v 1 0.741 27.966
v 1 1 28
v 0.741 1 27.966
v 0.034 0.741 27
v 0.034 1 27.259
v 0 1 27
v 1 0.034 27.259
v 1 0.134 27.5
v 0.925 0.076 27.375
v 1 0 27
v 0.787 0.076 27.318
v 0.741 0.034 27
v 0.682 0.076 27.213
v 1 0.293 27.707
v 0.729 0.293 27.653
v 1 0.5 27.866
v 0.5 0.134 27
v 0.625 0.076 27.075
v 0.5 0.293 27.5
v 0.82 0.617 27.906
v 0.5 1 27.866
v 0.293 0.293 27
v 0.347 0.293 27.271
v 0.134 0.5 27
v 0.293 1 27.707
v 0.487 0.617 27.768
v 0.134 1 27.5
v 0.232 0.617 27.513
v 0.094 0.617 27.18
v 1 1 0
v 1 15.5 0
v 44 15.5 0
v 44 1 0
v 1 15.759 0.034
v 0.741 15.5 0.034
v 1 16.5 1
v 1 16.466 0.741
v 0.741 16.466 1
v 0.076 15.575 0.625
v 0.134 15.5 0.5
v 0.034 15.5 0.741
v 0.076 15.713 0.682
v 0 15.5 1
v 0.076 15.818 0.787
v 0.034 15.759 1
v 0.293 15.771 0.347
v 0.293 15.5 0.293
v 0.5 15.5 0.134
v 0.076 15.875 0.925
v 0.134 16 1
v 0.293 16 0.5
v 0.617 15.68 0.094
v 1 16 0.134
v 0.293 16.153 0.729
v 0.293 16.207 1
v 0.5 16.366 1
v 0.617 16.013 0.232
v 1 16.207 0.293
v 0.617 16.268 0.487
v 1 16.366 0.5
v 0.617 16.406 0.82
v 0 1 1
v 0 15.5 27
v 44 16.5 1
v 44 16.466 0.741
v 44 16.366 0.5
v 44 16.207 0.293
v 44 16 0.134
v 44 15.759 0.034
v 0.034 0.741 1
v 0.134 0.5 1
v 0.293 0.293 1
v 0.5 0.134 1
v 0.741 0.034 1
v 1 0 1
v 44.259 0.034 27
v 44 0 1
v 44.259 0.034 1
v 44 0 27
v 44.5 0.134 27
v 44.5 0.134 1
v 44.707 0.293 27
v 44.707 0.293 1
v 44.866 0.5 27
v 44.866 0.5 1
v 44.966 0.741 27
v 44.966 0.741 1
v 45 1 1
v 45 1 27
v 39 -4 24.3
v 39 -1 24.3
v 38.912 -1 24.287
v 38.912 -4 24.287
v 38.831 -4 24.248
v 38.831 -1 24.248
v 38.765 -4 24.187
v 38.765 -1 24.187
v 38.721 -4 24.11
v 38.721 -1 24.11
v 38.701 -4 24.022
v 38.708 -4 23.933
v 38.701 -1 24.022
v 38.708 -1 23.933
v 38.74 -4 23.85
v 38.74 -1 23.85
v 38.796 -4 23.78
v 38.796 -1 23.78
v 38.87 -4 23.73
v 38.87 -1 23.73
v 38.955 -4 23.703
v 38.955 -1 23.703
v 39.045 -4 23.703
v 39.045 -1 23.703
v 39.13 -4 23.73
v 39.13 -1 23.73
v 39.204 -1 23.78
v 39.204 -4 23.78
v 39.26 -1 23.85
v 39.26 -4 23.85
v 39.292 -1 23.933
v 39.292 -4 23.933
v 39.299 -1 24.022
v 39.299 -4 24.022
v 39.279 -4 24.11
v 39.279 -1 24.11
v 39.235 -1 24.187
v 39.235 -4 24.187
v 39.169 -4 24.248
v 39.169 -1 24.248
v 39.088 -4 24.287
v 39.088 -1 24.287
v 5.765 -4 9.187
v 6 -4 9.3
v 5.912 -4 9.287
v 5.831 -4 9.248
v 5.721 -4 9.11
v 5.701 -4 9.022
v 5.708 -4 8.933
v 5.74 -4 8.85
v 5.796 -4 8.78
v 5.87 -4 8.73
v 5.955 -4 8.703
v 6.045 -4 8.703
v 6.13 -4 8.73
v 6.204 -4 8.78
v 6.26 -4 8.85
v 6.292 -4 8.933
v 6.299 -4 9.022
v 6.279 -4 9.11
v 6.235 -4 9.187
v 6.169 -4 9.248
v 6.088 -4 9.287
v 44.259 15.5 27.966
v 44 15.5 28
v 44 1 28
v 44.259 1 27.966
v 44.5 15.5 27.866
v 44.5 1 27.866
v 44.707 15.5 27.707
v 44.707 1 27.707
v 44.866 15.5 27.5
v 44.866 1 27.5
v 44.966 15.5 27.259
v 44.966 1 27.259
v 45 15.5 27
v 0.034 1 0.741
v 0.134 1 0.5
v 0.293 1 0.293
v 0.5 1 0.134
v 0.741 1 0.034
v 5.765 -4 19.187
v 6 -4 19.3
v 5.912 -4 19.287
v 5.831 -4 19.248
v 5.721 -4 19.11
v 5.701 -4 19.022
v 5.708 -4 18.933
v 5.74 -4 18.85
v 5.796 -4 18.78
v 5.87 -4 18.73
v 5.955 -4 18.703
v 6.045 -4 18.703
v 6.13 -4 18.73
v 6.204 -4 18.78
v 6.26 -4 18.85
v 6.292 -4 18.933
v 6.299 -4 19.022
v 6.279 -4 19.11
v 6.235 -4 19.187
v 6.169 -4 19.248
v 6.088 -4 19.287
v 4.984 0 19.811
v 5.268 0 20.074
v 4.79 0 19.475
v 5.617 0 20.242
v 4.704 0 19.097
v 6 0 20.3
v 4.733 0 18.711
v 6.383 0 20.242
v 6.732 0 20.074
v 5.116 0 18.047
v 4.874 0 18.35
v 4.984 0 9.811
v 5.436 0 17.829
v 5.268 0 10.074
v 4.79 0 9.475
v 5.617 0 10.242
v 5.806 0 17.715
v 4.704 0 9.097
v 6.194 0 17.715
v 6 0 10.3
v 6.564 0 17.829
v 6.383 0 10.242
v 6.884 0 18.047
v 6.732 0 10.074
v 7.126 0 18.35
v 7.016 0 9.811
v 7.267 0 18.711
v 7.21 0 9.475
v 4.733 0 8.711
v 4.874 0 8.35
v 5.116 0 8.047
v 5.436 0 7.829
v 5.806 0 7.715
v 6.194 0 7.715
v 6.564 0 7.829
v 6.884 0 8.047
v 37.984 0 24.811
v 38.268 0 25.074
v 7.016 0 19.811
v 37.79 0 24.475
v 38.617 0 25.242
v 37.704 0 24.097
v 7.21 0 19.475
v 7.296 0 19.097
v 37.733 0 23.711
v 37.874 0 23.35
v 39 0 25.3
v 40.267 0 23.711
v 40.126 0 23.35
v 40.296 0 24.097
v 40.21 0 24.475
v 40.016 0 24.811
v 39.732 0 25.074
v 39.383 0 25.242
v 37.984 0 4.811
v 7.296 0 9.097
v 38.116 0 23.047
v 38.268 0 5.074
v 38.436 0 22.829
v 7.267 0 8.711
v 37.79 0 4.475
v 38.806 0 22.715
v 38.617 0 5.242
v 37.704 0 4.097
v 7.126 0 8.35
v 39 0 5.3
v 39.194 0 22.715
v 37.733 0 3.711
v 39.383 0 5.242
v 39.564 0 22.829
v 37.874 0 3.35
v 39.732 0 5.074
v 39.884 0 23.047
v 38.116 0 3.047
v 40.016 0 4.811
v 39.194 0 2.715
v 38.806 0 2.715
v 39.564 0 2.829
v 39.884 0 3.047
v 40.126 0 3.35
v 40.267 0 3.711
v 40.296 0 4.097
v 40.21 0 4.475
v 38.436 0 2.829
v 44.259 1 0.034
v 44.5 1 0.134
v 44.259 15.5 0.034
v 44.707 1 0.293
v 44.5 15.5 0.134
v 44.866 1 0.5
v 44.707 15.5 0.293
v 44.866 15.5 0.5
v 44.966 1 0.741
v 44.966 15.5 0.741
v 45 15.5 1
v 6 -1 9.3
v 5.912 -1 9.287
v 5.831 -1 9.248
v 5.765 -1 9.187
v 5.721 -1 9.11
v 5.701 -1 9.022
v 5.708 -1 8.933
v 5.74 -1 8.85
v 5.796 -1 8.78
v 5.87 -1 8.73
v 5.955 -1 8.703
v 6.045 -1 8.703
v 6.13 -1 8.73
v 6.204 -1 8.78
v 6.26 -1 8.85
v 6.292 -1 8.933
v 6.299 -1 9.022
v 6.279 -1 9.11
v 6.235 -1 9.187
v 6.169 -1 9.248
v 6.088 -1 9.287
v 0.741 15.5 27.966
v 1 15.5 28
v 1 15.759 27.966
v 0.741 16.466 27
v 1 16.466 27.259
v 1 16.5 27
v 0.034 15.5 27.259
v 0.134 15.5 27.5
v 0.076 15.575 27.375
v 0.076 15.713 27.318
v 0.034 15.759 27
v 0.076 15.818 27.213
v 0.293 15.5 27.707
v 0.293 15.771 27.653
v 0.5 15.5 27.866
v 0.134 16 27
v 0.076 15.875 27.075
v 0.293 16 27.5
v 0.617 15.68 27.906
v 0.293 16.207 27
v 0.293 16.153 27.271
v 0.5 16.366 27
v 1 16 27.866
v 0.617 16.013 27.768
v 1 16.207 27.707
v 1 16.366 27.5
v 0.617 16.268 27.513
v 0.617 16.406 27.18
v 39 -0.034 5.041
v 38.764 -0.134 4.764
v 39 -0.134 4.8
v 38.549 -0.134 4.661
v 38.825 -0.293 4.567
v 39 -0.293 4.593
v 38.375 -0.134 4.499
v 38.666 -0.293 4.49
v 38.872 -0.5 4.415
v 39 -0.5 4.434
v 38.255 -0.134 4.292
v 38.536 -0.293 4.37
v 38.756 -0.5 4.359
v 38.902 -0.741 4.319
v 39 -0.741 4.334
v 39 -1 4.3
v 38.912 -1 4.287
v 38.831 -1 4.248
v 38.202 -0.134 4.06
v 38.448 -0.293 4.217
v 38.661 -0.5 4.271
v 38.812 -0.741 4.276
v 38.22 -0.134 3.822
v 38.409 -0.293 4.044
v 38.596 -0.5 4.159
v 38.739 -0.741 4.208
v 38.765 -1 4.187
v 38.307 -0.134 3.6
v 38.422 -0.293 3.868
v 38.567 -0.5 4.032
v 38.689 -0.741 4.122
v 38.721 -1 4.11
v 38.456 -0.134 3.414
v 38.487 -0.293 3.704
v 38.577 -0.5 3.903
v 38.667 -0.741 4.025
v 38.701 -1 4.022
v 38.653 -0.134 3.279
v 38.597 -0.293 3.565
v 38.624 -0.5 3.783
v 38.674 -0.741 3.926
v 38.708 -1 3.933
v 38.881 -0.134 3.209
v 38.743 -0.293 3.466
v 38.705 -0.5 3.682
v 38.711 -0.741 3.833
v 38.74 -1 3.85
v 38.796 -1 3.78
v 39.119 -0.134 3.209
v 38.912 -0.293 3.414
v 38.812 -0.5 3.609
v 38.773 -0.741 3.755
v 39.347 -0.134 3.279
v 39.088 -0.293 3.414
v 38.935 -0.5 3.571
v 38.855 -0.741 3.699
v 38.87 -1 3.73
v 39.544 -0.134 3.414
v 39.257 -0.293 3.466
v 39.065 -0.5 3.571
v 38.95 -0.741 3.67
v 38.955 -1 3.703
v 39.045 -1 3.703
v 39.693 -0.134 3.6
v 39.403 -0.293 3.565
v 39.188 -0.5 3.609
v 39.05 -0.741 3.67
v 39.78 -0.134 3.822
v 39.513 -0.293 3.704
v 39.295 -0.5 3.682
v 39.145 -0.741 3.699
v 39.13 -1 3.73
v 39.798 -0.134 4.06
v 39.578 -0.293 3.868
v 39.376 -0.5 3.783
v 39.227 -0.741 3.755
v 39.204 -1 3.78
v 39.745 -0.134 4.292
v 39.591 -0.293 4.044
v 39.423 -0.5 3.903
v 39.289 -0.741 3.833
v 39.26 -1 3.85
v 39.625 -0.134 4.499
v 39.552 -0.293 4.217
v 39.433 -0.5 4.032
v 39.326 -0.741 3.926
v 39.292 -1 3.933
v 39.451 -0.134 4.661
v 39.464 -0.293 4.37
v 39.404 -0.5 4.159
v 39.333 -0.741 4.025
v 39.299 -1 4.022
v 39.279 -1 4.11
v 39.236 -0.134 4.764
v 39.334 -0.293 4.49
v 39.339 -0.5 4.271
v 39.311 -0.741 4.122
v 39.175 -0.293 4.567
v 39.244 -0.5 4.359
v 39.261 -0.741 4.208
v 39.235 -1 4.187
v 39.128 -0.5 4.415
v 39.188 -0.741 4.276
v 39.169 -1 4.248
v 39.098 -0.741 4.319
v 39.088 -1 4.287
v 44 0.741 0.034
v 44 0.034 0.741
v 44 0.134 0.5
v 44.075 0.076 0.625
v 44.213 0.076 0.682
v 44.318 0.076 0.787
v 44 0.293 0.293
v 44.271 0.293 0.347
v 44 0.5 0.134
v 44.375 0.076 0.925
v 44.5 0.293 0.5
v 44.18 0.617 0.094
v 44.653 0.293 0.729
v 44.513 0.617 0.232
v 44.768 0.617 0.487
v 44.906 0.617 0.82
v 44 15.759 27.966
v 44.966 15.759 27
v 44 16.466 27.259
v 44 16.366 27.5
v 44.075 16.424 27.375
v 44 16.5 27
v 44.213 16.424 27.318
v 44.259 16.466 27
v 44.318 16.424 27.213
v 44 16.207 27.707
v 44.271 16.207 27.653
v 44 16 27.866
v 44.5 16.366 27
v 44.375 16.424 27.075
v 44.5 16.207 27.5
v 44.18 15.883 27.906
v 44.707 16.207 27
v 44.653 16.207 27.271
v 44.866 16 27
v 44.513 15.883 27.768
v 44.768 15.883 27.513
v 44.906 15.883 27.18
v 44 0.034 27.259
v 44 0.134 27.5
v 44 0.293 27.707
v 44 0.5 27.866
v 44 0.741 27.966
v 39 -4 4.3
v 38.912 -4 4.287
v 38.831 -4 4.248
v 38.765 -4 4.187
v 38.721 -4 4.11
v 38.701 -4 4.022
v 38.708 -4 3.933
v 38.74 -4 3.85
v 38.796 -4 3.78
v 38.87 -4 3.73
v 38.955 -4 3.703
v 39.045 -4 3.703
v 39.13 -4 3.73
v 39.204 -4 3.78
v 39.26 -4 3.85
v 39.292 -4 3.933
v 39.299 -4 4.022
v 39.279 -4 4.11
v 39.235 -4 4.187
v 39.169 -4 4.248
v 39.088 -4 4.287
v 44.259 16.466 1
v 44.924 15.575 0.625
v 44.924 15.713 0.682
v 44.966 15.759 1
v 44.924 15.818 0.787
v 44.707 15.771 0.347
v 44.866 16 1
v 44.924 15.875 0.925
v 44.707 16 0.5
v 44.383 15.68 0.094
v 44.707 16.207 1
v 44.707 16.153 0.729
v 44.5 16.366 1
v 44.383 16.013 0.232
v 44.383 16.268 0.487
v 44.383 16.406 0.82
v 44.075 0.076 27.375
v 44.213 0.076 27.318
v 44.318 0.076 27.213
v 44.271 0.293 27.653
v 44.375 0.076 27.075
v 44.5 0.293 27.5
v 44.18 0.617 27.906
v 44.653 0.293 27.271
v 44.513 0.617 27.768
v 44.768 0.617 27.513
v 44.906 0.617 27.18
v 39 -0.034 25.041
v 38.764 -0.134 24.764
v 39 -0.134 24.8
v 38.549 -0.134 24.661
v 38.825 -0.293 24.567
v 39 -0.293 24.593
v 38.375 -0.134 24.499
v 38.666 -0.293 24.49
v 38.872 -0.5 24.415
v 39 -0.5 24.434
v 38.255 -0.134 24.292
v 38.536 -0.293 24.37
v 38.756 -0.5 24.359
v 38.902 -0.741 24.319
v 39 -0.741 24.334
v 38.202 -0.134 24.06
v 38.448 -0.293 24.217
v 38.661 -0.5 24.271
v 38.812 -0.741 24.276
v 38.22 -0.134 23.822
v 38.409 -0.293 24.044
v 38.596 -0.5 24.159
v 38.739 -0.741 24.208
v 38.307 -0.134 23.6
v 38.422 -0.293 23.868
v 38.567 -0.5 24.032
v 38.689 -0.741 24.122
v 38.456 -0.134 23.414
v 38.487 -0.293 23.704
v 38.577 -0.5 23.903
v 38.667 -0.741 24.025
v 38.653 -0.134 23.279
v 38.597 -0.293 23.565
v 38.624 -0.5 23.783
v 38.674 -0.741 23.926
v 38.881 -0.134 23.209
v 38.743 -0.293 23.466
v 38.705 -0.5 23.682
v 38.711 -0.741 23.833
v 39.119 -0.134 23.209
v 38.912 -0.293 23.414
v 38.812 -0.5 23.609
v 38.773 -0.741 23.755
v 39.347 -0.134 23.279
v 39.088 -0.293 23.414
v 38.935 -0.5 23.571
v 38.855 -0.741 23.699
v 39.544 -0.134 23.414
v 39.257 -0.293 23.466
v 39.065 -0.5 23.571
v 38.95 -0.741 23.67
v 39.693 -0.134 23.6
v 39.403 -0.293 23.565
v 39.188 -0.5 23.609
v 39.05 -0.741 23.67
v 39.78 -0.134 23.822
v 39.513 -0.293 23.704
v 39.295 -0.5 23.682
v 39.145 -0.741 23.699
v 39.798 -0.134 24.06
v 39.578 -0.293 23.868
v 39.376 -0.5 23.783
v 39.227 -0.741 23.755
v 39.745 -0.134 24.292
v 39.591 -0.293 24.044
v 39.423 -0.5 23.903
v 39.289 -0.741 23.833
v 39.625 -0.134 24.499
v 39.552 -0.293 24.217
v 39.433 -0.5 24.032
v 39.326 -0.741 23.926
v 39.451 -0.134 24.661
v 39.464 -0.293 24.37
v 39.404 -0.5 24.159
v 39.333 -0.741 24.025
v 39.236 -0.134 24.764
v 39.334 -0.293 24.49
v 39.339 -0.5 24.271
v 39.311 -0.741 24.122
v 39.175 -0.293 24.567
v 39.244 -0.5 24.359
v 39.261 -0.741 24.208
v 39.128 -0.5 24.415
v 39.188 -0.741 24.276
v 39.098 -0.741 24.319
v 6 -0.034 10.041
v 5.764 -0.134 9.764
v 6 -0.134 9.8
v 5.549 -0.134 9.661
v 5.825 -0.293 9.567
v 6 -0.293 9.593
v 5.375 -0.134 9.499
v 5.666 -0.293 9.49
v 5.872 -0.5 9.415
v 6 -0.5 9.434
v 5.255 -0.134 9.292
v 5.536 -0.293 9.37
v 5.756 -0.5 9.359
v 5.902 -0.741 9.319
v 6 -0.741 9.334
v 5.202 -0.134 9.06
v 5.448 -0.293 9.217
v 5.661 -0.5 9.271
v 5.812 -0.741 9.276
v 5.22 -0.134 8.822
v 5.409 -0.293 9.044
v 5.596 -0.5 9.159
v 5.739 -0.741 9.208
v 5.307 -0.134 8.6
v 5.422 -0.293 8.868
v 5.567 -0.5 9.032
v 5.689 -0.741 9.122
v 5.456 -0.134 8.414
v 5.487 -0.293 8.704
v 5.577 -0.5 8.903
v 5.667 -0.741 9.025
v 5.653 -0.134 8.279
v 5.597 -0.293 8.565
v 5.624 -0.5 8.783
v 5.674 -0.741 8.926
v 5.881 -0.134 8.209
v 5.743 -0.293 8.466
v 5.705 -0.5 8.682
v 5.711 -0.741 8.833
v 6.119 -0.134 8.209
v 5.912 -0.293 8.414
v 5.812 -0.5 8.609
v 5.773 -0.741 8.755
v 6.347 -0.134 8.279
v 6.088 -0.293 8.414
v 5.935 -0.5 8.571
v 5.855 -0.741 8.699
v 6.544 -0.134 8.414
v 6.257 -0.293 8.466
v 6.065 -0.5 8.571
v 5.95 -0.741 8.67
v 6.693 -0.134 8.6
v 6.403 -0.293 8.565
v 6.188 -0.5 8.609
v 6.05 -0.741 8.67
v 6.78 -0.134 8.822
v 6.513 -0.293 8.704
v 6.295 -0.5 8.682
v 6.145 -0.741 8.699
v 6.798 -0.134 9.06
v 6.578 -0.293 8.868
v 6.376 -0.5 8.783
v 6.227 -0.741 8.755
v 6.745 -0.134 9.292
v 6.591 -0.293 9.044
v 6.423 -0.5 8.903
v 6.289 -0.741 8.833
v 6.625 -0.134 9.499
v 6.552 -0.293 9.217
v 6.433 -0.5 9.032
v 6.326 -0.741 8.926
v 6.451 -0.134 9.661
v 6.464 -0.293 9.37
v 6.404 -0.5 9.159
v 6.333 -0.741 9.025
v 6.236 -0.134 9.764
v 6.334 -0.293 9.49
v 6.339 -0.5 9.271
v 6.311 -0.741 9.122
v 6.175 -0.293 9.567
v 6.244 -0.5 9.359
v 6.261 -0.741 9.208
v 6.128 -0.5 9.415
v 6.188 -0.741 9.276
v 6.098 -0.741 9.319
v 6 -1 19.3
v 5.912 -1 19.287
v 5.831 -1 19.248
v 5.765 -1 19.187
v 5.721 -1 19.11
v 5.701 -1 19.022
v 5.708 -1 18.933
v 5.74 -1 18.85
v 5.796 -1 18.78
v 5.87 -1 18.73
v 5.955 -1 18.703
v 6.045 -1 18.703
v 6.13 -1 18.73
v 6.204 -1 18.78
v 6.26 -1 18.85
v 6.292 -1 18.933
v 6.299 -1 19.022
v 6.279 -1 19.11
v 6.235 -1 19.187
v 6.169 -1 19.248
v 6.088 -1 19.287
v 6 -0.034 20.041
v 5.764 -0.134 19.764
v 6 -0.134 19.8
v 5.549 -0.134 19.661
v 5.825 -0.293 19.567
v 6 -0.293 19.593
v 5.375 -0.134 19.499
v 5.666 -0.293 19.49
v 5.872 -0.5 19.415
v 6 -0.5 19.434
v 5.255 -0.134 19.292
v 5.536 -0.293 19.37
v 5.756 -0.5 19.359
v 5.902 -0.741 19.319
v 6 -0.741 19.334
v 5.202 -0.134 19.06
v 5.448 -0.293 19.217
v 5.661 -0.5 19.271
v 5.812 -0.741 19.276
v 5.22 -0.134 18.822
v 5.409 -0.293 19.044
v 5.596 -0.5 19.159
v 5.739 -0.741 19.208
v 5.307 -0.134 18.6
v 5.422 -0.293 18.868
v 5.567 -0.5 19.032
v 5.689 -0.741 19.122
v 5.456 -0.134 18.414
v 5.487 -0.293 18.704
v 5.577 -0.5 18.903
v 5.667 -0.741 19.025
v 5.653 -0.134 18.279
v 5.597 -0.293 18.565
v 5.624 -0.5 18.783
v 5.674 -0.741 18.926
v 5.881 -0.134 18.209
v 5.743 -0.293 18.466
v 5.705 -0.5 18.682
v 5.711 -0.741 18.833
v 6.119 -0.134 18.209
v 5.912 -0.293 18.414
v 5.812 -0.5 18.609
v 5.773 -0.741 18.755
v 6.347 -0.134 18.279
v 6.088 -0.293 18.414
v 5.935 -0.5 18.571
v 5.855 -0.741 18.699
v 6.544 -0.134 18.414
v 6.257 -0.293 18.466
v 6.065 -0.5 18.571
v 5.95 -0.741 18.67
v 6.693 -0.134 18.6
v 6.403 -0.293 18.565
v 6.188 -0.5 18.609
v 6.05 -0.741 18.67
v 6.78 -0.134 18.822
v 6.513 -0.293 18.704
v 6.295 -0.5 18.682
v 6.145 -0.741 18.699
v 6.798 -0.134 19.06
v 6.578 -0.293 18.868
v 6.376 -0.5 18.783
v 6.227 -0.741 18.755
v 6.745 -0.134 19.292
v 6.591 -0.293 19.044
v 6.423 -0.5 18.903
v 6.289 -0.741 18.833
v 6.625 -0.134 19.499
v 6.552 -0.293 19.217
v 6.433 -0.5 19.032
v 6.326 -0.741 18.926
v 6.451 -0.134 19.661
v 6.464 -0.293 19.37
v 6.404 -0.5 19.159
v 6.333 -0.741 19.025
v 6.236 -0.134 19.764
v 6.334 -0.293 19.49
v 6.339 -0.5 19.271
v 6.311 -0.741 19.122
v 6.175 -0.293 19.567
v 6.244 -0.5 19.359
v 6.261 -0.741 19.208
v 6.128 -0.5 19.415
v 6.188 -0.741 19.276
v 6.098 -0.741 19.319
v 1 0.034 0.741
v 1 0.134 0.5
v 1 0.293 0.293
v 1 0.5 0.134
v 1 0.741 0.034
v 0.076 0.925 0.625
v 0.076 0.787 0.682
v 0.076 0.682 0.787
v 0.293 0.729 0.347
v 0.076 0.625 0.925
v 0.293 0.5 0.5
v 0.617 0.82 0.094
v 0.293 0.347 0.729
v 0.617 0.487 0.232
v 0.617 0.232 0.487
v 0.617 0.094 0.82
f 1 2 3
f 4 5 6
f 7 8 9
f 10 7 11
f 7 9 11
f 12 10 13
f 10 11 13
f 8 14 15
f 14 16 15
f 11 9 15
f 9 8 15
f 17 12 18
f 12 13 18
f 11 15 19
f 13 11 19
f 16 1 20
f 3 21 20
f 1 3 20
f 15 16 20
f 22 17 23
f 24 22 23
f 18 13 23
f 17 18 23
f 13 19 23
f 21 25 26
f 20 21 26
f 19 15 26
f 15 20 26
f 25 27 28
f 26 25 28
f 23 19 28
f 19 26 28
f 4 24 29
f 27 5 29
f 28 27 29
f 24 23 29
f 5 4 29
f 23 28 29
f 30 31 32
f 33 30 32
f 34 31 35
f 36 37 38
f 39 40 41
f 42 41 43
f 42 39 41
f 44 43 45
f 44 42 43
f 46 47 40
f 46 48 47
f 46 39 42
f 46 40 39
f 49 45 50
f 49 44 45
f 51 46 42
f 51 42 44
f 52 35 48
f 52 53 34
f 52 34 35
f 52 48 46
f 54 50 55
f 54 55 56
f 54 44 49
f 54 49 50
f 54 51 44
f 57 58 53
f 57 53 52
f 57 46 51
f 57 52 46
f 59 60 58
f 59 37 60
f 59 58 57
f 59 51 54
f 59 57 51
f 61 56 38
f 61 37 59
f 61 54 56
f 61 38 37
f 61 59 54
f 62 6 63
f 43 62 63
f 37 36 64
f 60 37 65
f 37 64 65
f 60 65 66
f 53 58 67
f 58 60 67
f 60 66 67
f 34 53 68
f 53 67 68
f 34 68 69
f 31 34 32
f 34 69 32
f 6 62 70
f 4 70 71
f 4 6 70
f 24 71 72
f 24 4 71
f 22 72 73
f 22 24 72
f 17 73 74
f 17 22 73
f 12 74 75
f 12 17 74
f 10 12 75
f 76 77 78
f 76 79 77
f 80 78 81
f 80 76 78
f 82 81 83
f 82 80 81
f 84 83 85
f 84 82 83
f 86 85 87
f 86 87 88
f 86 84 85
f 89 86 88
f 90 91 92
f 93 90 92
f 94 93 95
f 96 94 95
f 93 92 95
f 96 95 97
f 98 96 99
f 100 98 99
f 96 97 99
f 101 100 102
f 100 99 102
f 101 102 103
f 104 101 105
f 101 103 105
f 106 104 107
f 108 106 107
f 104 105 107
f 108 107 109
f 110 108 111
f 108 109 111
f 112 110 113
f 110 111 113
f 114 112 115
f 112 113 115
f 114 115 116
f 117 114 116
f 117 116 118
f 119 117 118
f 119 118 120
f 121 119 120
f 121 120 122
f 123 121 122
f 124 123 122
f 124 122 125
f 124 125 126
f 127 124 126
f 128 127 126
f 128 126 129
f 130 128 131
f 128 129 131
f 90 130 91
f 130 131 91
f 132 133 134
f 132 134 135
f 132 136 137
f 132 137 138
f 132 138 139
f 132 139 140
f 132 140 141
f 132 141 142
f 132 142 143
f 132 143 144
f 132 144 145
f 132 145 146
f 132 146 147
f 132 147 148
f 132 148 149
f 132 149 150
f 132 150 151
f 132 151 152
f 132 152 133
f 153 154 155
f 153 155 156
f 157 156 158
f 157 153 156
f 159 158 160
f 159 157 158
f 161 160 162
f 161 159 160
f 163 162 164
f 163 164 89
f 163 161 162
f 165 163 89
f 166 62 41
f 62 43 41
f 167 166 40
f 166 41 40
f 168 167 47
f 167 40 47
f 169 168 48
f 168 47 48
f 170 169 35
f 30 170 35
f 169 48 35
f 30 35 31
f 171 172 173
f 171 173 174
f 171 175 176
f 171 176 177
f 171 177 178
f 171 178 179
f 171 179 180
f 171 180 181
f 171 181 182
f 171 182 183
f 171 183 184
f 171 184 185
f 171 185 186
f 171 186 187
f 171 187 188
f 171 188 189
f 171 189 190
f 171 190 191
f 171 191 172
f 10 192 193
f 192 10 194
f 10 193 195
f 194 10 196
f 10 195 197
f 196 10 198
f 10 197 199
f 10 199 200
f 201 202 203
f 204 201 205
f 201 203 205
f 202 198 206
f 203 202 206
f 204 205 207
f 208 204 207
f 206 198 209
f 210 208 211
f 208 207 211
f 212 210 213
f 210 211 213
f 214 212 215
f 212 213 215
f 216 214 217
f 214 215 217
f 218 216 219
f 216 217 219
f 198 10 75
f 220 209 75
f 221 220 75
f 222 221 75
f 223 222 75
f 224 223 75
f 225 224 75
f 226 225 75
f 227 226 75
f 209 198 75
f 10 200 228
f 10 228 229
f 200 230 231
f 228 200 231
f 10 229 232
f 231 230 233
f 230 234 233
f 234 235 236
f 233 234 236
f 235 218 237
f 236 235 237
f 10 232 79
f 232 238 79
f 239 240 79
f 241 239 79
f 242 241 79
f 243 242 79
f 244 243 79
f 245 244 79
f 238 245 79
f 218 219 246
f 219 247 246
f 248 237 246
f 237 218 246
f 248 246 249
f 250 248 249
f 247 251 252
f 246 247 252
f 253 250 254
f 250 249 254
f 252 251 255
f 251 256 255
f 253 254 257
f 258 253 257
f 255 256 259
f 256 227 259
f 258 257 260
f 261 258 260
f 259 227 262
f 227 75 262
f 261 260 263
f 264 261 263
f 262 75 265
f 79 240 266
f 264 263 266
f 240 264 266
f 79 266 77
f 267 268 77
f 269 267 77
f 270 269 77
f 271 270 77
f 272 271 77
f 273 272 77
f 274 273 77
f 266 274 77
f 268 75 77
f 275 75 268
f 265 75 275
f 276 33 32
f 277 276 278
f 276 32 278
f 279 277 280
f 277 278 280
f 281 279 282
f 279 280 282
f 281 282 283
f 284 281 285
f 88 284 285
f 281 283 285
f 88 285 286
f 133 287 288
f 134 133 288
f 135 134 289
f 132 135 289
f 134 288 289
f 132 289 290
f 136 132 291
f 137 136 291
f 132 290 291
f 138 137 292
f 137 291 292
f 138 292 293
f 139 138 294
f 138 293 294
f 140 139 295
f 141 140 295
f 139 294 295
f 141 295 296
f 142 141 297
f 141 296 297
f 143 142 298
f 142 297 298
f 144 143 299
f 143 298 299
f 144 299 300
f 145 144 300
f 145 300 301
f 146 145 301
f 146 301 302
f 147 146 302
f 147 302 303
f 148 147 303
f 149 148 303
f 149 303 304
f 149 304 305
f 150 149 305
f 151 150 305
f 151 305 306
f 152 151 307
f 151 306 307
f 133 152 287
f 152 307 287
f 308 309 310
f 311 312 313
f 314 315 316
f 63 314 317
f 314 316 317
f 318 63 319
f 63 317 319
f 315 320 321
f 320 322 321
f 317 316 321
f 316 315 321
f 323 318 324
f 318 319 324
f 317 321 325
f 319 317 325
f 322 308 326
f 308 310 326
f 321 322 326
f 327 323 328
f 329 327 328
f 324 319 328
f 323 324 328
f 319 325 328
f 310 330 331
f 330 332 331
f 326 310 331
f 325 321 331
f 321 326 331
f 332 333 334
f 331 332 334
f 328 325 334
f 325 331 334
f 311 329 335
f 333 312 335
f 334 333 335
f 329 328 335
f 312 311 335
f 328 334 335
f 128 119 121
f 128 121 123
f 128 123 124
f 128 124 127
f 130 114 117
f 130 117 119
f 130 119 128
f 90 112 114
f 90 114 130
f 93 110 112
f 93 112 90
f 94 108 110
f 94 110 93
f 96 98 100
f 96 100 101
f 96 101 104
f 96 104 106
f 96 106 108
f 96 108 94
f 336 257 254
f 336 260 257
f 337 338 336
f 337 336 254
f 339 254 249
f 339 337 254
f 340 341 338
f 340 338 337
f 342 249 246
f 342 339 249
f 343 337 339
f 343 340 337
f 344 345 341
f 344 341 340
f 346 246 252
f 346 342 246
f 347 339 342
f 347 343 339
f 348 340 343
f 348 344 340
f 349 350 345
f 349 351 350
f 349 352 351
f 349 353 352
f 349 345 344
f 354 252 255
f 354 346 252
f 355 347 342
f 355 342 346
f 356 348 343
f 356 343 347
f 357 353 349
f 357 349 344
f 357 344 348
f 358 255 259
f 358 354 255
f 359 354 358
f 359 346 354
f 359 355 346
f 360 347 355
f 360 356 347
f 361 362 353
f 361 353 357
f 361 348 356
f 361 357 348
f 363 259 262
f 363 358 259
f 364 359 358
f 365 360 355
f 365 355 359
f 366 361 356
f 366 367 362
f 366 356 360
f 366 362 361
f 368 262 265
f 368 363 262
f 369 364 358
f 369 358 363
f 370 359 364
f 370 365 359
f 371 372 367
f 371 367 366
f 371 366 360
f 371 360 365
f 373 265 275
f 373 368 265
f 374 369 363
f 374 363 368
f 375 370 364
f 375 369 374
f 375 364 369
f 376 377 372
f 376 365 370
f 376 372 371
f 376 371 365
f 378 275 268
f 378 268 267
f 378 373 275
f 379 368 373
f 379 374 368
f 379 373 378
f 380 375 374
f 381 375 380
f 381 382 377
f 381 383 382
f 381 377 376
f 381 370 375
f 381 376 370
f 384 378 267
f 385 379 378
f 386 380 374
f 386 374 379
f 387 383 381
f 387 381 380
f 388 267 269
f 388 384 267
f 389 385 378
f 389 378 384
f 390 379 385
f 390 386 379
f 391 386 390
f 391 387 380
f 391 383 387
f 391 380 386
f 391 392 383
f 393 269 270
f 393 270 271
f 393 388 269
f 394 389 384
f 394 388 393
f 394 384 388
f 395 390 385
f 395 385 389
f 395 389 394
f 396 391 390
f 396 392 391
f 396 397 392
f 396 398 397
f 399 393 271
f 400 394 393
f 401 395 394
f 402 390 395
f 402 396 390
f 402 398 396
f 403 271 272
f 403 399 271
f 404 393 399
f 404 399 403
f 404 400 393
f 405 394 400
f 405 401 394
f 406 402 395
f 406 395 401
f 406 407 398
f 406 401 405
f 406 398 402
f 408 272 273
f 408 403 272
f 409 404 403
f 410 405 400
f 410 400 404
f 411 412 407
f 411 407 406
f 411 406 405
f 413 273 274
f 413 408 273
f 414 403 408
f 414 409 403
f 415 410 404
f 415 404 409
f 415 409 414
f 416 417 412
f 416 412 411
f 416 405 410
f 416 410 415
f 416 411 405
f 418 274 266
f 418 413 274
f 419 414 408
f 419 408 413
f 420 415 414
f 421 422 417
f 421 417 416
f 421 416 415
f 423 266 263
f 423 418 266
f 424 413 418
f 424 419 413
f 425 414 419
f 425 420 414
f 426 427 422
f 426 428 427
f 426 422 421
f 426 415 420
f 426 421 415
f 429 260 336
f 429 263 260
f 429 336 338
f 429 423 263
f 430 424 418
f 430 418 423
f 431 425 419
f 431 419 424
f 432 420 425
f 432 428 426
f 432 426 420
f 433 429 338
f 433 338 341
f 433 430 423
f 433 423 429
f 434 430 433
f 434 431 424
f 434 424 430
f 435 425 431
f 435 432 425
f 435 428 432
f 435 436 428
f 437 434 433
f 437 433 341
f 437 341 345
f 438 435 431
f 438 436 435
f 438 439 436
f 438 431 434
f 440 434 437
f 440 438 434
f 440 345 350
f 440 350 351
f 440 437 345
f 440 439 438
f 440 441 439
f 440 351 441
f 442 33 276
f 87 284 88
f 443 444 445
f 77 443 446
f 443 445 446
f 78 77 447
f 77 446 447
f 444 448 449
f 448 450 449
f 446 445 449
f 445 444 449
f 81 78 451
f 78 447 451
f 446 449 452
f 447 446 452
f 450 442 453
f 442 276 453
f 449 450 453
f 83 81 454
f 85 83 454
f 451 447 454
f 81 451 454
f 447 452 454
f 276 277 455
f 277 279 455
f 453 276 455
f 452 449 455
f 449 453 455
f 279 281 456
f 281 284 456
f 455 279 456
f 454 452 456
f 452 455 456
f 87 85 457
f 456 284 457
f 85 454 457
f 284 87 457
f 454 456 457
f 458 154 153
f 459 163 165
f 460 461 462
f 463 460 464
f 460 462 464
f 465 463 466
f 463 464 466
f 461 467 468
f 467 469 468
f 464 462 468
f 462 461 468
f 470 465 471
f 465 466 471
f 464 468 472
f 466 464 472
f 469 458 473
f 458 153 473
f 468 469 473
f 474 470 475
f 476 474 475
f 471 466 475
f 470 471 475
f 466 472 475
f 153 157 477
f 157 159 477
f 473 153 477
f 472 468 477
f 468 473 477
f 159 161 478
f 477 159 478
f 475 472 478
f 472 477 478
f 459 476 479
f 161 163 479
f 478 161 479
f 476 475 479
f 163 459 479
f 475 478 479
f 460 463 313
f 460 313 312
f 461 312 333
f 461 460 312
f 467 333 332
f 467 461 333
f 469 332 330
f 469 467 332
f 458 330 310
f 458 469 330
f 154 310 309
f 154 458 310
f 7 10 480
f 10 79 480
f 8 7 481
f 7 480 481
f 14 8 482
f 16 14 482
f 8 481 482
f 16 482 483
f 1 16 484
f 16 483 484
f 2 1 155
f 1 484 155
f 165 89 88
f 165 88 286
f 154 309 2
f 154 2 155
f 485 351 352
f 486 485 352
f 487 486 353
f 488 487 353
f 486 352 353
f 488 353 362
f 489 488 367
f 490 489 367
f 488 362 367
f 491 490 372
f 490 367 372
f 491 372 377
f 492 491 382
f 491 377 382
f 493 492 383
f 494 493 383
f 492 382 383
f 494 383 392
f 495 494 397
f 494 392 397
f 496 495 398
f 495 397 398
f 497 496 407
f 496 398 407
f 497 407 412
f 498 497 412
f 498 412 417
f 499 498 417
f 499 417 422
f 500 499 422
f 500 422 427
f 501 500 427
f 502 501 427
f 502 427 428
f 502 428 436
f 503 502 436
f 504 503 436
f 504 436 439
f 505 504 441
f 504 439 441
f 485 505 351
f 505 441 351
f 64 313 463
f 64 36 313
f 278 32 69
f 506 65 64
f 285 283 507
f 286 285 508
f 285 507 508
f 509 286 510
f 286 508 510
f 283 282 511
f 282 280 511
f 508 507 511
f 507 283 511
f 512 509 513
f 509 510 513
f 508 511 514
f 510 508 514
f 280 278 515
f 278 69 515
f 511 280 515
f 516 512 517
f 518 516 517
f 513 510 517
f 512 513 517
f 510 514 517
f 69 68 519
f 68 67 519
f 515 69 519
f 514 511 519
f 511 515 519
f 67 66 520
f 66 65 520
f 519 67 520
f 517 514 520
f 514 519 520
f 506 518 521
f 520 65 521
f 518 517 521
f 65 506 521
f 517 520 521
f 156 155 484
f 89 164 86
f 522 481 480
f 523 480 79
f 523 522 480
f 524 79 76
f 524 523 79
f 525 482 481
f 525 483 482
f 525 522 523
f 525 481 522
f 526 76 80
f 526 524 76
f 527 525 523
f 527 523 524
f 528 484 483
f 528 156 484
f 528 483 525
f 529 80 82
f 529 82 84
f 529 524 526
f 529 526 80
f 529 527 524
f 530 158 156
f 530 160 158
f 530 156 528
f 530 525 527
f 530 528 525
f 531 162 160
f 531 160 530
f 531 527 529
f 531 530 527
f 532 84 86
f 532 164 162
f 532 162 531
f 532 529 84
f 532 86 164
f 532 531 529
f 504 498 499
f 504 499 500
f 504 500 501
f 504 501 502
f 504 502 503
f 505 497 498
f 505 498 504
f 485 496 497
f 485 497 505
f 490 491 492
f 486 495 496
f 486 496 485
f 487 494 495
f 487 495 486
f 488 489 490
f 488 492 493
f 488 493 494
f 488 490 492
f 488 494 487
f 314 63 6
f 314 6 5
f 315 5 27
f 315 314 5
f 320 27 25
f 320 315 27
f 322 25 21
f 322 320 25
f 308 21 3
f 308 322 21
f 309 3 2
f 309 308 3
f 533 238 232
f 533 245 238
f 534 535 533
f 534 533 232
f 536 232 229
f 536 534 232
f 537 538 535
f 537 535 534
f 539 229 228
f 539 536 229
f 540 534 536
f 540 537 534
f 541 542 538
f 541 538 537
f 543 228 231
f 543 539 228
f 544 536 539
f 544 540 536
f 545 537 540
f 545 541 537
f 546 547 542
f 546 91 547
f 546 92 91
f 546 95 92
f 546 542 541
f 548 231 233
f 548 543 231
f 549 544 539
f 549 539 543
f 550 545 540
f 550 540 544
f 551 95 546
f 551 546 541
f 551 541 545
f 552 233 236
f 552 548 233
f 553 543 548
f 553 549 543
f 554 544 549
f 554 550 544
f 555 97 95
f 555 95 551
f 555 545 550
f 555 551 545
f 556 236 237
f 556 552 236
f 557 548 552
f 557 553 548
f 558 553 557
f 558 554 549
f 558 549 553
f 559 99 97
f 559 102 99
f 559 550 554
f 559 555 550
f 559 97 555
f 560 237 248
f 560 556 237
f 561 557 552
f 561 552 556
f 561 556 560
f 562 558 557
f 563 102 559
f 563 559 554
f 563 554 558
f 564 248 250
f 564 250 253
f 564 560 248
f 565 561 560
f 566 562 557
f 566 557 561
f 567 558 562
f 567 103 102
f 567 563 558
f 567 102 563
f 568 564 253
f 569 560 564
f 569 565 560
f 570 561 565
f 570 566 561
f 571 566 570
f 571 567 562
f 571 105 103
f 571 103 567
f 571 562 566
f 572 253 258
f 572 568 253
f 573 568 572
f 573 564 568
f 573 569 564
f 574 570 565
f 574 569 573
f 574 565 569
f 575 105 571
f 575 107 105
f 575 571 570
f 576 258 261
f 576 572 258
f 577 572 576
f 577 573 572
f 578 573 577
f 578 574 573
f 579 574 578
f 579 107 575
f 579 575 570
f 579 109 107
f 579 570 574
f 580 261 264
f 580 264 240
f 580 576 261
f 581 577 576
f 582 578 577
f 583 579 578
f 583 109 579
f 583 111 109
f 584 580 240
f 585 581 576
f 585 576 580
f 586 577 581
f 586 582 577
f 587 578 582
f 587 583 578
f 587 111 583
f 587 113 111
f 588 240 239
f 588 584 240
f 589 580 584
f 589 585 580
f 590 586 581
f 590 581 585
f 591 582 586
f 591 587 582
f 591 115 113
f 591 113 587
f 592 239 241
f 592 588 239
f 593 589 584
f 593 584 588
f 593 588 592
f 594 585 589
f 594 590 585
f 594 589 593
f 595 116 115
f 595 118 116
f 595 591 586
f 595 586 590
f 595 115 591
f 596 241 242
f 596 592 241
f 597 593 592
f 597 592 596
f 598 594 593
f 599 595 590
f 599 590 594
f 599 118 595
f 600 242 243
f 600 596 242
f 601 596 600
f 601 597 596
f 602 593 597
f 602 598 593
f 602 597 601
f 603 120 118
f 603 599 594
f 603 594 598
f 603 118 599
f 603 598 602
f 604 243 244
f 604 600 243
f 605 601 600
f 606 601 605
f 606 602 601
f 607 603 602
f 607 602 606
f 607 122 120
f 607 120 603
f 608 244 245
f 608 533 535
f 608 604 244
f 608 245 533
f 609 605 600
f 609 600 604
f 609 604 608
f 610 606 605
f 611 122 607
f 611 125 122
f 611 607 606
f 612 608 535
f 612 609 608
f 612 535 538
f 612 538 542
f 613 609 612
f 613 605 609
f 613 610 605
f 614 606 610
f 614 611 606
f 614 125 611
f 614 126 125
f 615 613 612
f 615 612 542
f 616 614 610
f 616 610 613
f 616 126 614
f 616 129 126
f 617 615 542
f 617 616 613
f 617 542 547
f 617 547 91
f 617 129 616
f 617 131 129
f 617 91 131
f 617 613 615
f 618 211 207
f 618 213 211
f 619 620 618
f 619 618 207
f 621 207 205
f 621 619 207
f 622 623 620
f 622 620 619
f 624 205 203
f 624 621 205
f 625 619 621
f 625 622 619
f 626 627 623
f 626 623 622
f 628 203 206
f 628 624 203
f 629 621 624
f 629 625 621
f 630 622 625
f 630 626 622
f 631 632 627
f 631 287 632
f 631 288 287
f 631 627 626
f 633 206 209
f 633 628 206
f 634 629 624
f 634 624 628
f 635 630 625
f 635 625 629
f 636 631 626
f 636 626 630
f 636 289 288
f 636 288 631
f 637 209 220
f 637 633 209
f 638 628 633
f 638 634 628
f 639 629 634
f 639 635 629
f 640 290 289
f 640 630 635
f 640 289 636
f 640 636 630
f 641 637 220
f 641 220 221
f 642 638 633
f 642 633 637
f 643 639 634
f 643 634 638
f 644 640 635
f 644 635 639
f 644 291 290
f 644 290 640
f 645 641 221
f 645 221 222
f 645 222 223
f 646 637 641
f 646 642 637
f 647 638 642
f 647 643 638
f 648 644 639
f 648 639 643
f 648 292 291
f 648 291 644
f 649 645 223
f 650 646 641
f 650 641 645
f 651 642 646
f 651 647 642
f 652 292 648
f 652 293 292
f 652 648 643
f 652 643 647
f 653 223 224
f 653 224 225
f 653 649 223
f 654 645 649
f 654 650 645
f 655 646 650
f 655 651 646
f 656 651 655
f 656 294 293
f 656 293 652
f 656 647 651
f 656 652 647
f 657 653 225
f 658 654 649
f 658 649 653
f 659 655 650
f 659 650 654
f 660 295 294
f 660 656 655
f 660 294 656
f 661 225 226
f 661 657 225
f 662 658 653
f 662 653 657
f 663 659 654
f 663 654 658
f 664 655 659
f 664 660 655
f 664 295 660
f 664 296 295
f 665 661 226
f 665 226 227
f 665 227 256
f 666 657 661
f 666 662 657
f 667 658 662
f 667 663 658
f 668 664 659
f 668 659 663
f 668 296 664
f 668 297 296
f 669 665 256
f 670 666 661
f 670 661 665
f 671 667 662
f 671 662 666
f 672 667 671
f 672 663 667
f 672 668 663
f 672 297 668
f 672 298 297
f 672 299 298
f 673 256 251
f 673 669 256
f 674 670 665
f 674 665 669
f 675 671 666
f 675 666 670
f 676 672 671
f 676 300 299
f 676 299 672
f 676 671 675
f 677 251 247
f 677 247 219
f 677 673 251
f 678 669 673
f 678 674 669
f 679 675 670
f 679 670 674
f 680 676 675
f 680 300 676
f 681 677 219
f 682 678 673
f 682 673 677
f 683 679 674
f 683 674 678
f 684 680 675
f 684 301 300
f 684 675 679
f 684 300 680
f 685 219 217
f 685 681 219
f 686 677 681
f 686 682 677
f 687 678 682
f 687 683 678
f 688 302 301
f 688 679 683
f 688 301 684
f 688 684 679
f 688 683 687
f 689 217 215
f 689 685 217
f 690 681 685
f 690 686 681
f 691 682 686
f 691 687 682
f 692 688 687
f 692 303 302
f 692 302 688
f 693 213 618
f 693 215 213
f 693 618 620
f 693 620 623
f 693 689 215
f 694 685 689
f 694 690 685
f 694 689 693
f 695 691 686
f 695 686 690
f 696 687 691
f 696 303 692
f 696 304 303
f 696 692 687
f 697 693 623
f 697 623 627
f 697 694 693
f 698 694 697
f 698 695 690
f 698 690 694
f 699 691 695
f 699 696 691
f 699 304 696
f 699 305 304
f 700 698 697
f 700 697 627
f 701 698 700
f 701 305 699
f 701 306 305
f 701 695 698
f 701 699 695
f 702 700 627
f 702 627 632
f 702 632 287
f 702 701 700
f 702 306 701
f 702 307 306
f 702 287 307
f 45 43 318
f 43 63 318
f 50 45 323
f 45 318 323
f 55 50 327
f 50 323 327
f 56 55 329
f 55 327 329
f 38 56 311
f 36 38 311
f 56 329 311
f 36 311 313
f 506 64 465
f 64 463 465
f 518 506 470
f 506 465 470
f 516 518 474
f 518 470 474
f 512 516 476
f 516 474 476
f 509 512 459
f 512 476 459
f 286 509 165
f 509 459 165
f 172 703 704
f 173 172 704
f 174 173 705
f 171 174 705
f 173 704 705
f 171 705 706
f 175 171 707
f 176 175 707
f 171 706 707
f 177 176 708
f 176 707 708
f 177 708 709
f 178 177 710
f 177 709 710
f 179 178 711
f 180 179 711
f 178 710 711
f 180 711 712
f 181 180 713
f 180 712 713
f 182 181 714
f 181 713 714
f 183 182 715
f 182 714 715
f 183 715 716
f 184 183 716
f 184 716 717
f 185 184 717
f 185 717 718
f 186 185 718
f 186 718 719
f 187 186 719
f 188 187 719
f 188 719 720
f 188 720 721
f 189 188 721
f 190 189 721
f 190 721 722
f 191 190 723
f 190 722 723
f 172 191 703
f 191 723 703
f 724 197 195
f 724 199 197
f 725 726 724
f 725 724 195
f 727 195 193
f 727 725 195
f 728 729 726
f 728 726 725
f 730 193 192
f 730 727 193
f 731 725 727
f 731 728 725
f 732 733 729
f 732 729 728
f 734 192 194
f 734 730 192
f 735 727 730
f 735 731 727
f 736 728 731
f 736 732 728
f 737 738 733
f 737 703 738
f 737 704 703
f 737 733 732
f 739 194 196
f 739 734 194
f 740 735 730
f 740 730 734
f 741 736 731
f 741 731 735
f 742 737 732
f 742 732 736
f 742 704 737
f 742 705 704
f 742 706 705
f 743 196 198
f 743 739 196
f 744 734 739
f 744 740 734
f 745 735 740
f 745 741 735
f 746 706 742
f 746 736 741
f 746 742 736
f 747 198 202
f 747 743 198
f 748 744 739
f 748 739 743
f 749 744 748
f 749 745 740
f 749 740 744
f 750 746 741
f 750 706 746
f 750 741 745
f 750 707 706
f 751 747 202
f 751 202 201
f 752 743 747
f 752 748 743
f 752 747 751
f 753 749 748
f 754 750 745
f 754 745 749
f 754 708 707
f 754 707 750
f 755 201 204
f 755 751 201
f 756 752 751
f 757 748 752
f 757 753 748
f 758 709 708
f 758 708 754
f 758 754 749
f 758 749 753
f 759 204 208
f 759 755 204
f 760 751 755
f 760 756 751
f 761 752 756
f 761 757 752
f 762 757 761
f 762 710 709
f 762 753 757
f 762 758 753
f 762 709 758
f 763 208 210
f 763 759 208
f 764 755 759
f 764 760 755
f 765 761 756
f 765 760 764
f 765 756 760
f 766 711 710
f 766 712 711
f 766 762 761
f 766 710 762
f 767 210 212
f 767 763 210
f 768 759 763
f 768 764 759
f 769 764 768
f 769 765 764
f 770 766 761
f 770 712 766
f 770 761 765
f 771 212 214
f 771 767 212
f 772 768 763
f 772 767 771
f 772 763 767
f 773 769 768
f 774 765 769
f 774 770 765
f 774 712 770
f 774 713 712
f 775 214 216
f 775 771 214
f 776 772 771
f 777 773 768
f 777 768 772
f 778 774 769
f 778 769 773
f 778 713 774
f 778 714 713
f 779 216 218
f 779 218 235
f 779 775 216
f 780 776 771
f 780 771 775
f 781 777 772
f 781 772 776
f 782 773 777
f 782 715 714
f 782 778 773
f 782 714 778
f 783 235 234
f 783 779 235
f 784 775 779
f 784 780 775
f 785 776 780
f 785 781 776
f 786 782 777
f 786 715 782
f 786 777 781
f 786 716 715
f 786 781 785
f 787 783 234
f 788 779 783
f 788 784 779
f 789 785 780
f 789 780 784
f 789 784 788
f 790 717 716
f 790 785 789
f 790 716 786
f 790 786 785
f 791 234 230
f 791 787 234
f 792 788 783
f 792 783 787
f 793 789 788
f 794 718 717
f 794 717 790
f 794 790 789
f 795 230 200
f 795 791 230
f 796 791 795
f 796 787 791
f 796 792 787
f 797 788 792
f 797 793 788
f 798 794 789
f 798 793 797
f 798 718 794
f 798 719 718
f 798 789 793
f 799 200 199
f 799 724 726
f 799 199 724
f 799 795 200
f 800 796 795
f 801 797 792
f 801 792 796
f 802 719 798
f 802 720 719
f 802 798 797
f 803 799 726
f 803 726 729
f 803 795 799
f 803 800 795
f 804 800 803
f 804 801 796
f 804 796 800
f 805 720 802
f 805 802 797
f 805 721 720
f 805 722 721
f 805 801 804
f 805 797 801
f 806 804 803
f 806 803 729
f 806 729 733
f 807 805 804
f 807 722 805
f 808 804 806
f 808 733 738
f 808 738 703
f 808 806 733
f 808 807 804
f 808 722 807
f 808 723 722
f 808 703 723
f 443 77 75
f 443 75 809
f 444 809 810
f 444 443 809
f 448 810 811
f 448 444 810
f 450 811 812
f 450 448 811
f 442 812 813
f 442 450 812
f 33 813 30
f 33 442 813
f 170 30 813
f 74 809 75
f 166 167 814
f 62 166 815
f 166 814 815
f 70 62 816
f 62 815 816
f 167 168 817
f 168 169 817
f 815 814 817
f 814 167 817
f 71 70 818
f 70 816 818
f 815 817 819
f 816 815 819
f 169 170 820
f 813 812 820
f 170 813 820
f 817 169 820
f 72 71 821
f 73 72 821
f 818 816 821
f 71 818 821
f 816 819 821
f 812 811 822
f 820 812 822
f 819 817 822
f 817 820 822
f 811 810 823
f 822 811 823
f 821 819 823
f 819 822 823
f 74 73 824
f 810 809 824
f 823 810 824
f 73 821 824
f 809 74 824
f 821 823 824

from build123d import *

# Parameters (mm, degrees)
SKETCH1_W           = 45
SKETCH1_H           = 16.5
BOSS_EXTRUDE1_DEPTH = 28
SKETCH2_R           = 0.3
BOSS_EXTRUDE2_DEPTH = 4
FILLET1_R           = 1


with BuildPart() as part:
    # Sketch1 → Boss-Extrude1 (new body)
    with BuildSketch(Plane.XY):
        with Locations((22.5, 8.25)):
            Rectangle(SKETCH1_W, SKETCH1_H)
    extrude(amount=BOSS_EXTRUDE1_DEPTH)

    # Sketch2 → Boss-Extrude2 (add)
    with BuildSketch(Plane(origin=(0, 0, 0), x_dir=(-1, 0, 0), z_dir=(0, -1, 0))):
        with Locations(Location((-6, -19, 0), (0, 0, 270))):
            Circle(SKETCH2_R)
        with Locations(Location((-6, -9, 0), (0, 0, 270))):
            Circle(SKETCH2_R)
        with Locations(Location((-39, -24, 0), (0, 0, 270))):
            Circle(SKETCH2_R)
        with Locations(Location((-39, -4, 0), (0, 0, 270))):
            Circle(SKETCH2_R)
    extrude(amount=BOSS_EXTRUDE2_DEPTH)

    # Fillet1
    fillet1_edges = [part.edges().sort_by_distance(p)[0] for p in [
        (45, 8.25, 28),
        (22.5, 16.5, 28),
        (6, 0, 18.7),
        (6, 0, 8.7),
        (39, 0, 23.7),
        (39, 0, 3.7),
        (0, 8.25, 28),
        (22.5, 16.5, 0),
        (45, 8.25, 0),
        (22.5, 0, 0),
        (0, 8.25, 0),
        (22.5, 0, 28),
        (0, 16.5, 14),
        (45, 16.5, 14),
        (45, 0, 14),
        (0, 0, 14),
    ]]
    fillet(fillet1_edges, radius=FILLET1_R)


solid = part.part
